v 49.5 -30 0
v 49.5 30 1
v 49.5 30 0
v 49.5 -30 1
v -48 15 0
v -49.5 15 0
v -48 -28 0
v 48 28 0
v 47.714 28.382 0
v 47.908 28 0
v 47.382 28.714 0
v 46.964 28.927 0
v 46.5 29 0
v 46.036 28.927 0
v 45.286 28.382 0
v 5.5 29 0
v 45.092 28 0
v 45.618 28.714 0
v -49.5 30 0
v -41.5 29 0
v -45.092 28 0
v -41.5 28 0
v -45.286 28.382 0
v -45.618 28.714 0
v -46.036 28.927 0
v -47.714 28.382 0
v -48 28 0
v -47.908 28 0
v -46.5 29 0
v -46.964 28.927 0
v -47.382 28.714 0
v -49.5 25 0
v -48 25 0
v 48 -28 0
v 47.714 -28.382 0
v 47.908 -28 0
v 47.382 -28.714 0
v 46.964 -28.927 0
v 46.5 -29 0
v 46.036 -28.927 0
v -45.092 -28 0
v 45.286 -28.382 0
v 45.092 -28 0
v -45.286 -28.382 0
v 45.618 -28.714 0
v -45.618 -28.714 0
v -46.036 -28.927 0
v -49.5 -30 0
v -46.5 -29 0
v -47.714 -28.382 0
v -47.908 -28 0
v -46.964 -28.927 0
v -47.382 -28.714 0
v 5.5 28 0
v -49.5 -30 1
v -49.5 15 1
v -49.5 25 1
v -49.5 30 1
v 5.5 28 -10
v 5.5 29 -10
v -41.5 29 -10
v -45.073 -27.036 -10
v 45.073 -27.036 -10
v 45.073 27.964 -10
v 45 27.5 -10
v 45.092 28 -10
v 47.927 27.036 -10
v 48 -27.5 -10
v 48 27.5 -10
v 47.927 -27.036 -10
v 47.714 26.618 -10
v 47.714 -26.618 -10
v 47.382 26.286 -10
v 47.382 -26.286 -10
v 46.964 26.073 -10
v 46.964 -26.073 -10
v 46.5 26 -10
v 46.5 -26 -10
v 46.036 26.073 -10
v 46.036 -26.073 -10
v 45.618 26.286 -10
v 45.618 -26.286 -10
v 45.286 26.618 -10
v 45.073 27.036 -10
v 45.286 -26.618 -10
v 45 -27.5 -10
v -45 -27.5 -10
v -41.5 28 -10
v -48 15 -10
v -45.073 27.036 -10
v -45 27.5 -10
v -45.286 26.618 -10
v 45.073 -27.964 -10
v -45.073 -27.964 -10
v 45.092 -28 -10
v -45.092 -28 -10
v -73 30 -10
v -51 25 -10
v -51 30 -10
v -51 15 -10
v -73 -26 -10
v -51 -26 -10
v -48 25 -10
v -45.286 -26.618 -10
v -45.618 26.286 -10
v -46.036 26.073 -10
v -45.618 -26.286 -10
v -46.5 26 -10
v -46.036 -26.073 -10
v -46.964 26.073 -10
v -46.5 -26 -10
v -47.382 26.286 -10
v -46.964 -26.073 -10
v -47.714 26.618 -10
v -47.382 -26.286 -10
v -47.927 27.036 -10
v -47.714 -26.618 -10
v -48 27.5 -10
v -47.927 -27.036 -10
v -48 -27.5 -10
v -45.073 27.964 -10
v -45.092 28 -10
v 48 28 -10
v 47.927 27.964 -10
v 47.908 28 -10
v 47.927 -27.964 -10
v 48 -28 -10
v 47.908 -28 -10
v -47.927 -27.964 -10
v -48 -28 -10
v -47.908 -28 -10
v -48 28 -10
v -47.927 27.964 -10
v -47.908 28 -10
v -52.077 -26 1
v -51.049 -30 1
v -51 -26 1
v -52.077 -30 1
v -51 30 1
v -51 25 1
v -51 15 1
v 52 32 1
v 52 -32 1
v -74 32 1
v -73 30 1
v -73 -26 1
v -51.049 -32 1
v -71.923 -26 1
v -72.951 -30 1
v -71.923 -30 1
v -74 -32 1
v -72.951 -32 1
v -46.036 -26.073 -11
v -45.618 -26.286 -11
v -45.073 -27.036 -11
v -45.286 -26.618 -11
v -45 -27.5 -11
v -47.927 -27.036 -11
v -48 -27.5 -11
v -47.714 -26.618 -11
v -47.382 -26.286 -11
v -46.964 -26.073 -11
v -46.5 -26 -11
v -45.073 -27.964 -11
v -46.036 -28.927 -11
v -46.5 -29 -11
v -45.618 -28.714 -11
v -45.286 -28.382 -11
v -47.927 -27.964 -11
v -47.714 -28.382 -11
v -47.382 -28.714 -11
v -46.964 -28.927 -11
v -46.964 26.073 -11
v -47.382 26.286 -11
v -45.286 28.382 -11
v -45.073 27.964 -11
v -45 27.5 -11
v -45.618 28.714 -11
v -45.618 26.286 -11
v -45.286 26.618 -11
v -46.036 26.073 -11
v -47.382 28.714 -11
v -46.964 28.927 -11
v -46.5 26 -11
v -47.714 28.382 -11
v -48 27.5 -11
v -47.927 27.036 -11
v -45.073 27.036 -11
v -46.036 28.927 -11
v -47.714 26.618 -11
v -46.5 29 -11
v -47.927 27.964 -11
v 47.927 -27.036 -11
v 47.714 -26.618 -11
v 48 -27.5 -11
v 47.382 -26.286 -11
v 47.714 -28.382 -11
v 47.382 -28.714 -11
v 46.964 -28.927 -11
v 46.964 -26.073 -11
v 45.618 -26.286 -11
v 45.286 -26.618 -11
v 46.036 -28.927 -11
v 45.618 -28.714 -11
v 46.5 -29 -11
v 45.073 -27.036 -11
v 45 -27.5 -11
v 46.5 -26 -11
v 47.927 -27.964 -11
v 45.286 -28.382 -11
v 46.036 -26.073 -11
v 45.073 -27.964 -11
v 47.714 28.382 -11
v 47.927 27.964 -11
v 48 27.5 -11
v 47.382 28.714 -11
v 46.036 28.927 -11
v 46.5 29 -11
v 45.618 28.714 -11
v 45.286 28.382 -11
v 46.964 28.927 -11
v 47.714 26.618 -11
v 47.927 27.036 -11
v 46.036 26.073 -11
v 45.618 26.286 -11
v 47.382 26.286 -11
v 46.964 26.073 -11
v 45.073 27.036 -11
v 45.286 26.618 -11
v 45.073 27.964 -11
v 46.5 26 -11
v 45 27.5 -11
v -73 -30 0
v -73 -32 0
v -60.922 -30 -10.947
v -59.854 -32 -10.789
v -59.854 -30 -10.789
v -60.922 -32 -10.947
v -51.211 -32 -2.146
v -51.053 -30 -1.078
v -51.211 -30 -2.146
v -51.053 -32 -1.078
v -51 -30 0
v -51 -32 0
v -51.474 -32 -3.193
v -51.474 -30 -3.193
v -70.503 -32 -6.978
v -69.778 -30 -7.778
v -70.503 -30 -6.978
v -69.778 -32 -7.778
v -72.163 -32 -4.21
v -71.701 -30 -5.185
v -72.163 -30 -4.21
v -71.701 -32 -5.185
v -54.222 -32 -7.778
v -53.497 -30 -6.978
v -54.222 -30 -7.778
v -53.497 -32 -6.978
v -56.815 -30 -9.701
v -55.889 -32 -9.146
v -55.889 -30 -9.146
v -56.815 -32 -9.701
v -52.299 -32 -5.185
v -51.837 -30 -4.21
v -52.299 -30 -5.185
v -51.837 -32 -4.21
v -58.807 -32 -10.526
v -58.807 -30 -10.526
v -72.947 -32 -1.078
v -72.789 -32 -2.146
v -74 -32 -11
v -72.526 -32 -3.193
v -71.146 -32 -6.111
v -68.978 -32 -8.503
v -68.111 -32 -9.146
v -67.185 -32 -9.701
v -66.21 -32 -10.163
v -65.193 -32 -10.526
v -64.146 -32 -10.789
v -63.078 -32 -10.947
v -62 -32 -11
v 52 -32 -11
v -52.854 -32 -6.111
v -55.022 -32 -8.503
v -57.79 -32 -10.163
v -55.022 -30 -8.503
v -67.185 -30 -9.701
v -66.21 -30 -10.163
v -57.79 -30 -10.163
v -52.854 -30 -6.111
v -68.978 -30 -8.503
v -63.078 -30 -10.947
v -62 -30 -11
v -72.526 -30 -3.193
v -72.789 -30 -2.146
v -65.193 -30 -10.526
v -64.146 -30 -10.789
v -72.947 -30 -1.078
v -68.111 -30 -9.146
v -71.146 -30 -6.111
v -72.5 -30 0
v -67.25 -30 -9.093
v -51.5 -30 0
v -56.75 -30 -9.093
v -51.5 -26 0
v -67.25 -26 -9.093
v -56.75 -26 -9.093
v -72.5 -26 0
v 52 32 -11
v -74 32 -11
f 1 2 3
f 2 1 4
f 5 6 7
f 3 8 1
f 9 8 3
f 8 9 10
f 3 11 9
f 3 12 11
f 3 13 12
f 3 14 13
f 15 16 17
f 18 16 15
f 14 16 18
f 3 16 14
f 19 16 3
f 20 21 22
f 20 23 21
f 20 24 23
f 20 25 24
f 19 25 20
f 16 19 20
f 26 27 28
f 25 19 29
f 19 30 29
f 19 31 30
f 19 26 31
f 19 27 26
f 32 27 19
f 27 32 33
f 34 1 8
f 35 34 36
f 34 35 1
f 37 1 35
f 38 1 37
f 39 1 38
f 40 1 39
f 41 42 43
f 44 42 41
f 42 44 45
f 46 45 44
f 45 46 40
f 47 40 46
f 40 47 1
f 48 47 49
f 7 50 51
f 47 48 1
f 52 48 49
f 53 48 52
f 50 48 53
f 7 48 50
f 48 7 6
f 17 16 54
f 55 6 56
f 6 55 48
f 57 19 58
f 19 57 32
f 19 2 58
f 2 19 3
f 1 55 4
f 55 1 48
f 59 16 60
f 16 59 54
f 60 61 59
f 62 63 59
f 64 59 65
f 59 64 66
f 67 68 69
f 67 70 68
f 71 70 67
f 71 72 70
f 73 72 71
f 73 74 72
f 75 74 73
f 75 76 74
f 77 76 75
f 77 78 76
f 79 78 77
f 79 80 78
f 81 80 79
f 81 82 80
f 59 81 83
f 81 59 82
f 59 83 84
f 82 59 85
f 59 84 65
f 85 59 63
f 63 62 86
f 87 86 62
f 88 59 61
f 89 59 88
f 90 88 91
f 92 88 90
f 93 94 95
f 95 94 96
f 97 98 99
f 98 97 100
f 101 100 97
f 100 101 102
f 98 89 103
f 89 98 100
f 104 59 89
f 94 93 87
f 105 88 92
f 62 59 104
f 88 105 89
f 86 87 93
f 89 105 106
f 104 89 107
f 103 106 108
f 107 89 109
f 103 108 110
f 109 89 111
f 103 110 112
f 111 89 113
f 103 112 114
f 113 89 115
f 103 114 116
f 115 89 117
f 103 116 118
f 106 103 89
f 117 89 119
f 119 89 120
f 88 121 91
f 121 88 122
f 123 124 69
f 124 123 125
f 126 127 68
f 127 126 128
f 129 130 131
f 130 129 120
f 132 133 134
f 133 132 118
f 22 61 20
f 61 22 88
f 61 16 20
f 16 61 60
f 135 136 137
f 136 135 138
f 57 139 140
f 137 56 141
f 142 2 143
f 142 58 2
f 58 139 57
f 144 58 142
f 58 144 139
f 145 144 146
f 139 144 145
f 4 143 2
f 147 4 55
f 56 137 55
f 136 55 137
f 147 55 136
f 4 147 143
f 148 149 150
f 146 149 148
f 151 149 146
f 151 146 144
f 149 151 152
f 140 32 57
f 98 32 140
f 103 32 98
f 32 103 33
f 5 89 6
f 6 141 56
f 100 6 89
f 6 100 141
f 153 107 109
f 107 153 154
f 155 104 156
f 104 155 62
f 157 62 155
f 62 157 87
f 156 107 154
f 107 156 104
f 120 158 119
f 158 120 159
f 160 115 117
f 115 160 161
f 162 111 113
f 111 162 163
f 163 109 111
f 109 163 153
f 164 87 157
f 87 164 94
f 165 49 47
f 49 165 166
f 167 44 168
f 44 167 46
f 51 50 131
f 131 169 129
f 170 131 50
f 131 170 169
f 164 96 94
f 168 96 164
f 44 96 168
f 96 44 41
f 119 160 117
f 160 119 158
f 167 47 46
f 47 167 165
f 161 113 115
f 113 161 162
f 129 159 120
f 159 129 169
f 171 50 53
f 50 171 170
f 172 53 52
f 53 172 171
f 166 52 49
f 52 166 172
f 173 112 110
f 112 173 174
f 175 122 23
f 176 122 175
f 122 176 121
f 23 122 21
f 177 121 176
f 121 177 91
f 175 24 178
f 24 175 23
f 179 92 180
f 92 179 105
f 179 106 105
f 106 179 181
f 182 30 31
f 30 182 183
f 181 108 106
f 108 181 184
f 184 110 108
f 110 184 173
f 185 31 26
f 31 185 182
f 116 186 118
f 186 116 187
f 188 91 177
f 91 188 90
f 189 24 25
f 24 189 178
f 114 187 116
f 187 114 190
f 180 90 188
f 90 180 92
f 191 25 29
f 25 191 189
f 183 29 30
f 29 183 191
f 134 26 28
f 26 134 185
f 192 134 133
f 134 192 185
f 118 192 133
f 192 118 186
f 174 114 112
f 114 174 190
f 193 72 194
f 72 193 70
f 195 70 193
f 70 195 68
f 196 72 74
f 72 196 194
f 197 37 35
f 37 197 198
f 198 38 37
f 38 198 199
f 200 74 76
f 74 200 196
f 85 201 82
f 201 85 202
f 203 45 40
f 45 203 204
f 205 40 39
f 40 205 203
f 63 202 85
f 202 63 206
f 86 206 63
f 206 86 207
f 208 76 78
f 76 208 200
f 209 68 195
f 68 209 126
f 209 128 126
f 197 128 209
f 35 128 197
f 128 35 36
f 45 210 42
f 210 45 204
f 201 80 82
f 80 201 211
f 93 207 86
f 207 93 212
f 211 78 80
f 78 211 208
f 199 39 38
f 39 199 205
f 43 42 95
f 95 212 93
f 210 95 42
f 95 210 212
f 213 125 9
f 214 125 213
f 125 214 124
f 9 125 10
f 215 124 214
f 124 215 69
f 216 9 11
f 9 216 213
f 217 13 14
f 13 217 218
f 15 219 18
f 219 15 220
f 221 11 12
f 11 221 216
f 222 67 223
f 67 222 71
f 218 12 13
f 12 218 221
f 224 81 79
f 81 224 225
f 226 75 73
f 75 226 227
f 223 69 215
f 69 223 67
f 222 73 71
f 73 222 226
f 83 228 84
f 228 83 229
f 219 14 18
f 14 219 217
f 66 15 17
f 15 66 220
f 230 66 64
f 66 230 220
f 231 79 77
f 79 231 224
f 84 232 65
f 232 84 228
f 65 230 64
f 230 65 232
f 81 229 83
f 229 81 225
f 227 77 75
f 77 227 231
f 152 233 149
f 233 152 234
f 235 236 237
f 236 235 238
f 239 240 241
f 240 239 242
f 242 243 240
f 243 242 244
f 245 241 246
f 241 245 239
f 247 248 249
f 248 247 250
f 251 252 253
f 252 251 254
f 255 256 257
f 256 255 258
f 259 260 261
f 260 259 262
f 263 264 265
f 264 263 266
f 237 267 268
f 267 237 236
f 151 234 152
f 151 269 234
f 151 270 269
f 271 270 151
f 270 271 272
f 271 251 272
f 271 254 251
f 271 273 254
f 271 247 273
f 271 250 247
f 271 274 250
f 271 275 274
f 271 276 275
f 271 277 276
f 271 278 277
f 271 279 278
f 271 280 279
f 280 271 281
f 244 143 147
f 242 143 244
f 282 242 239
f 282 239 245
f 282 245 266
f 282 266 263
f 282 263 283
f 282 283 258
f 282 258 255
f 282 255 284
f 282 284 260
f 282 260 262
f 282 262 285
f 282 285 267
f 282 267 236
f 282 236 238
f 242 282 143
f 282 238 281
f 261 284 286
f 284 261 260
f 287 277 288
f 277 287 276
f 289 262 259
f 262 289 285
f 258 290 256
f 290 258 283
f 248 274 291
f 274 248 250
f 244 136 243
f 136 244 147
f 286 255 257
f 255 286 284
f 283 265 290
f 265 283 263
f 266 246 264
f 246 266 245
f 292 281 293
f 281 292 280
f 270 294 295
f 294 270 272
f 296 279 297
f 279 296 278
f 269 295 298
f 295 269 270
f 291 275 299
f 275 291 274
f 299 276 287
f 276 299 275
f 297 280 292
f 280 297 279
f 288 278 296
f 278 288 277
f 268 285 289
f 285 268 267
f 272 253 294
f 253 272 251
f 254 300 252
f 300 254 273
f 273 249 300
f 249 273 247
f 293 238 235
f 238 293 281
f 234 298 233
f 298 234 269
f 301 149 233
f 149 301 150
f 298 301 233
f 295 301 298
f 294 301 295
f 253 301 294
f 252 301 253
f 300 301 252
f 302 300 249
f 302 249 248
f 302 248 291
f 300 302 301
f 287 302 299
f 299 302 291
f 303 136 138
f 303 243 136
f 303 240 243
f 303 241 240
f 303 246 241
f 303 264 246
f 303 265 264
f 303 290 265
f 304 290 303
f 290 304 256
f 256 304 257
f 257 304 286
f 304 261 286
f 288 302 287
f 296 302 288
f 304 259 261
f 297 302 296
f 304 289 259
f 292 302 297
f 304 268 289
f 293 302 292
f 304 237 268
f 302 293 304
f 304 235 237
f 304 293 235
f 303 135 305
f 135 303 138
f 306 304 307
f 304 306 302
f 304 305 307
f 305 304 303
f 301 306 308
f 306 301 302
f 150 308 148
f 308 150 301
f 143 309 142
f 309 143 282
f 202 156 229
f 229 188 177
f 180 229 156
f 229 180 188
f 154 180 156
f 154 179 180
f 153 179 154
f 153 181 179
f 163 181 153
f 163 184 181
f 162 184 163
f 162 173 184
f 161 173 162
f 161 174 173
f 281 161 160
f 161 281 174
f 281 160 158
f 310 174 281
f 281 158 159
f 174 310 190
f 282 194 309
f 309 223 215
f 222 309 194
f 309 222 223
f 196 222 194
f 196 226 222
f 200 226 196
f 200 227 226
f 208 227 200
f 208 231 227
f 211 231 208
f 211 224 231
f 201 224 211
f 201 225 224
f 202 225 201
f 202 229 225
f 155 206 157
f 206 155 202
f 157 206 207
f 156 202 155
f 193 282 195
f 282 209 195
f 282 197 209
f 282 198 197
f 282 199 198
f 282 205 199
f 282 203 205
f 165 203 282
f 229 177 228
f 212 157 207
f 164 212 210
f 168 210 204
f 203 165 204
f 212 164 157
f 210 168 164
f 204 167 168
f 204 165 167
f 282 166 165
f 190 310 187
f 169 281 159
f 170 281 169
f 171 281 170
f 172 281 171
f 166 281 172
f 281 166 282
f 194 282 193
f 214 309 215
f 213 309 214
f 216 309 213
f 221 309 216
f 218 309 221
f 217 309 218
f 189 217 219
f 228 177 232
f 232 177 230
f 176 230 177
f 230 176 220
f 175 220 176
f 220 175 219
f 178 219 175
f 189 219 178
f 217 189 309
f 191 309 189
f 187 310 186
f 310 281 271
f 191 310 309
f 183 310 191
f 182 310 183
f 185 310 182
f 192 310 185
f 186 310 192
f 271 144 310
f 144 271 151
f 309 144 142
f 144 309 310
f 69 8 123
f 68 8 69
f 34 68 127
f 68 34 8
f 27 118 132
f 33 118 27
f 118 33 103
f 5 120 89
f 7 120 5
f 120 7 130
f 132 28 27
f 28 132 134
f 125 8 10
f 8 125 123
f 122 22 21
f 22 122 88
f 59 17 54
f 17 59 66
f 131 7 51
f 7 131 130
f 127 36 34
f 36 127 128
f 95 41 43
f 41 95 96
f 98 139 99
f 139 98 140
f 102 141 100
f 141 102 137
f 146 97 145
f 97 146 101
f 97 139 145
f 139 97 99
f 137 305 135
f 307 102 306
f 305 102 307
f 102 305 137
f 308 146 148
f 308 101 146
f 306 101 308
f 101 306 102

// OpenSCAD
IN_MM = 25.4;

tall_standoff_h = 55;
tall_standoff_threads = 6;
tall_standoff_or = 3;

module tall_standoff() {
	cylinder(r=tall_standoff_or, h=tall_standoff_h);
	translate([0, 0, -tall_standoff_threads])
		cylinder(r=tall_standoff_or/2, h=tall_standoff_threads);
}

acdc_w = 26;
acdc_h = 51;
acdc_d = 26;
acdc_clr = 3;
acdc_th = 2;
acdc_hole_c_c = [21, 46];
acdc_hole_ir = 3/2;

module acdc_holes() {
	for (x=[-0.5, 0.5])
		for (y=[-0.5, 0.5])
		translate([
			x*acdc_hole_c_c[0],
			y*acdc_hole_c_c[1], 0])
		cylinder(h=60, r=acdc_hole_ir, center=true, $fn=32);
}

module acdc() {
	difference() {
		union() {
			translate([0, 0, acdc_th/2])
				cube([acdc_w, acdc_h, acdc_th], center=true);
			translate([0, 0, acdc_d/2])
				cube([acdc_w-3, acdc_h-3, acdc_d], center=true);
		}
		acdc_holes();
	}
}

// ! acdc();


tblock_w = 136;
tblock_h = 35;
tblock_d = 16;
tblock_clr = 0;
tblock_th = 16;
tblock_hole_c_c = [124, 13.25];
tblock_hole_ir = 5/2;

module tblock_holes() {
	for (x=[-0.5, 0.5])
		for (y=[-0.5, 0.5])
		translate([
			x*tblock_hole_c_c[0],
			y*tblock_hole_c_c[1], 0])
		cylinder(h=60, r=tblock_hole_ir, center=true, $fn=32);
}

module tblock() {
	difference() {
		union() {
			translate([0, 0, tblock_th/2])
				cube([tblock_w, tblock_h, tblock_th], center=true);
			translate([0, 0, tblock_d/2])
				cube([tblock_w-3, tblock_h-3, tblock_d], center=true);
		}
		tblock_holes();
	}
}

// ! tblock();

arduino_w = 70;
arduino_h = 51;
arduino_d = 20;
arduino_clr = 3;
arduino_th = 2;
arduino_hole_c_c = [66, 46];
arduino_hole_ir = 3/2;

module arduino_holes() {
	for (x=[-0.5, 0.5])
		for (y=[-0.5, 0.5])
		translate([
			x*arduino_hole_c_c[0],
			y*arduino_hole_c_c[1], 0])
		cylinder(h=60, r=arduino_hole_ir, center=true, $fn=32);
}

module arduino() {
	difference() {
		union() {
			translate([0, 0, arduino_th/2])
				cube([arduino_w, arduino_h, arduino_th], center=true);
			translate([0, 0, arduino_d/2])
				cube([arduino_w-3, arduino_h-3, arduino_d], center=true);
		}
		arduino_holes();
	}
}

// ! arduino();

relay2_w = 40;
relay2_h = 50;
relay2_d = 17;
relay2_clr = 3;
relay2_th = 2;
relay2_hole_c_c = [34, 45];
relay2_hole_ir = 3/2;

module relay2_holes() {
	for (x=[-0.5, 0.5])
		for (y=[-0.5, 0.5])
		translate([
			x*relay2_hole_c_c[0],
			y*relay2_hole_c_c[1], 0])
		cylinder(h=50, r=relay2_hole_ir, center=true, $fn=32);
}

module relay2() {
	difference() {
		union() {
			translate([0, 0, relay2_th/2])
				cube([relay2_w, relay2_h, relay2_th], center=true);
			translate([0, 0, relay2_d/2])
				cube([relay2_w-3, relay2_h-3, relay2_d], center=true);
		}
		relay2_holes();
	}
}

// ! relay2();

relay4_w = 74;
relay4_h = 50;
relay4_d = 17;
relay4_clr = 3;
relay4_th = 2;
relay4_hole_c_c = [68, 45];
relay4_hole_ir = 3/2;

module relay4_holes() {
	for (x=[-0.5, 0.5])
		for (y=[-0.5, 0.5])
		translate([
			x*relay4_hole_c_c[0],
			y*relay4_hole_c_c[1], 0])
		cylinder(h=50, r=relay4_hole_ir, center=true, $fn=32);
}

module relay4() {
	difference() {
		union() {
			translate([0, 0, relay4_th/2])
				cube([relay4_w, relay4_h, relay4_th], center=true);
			translate([0, 0, relay4_d/2])
				cube([relay4_w-3, relay4_h-3, relay4_d], center=true);
		}
		relay4_holes();
	}
}

// ! relay4();

toggle_sw_body = [19, 34, 28];
toggle_or = 13/2;
toggle_thread_h = 13;
toggle_top_h = 30;
toggle_top_or = 3;

module toggle_switch() {
	translate([0, 0, -toggle_sw_body[2]/2])
		cube(toggle_sw_body, center=true);
	cylinder(r=toggle_or, h=toggle_thread_h);
	cylinder(r=toggle_top_or, h=toggle_top_h);
}

// ! toggle_switch();

module toggle_cage() {
	difference() {
		translate([-17/2, -6-8, 0])
			cube([17, 41, 2], center=false);
		* translate([-17/2, -6-8-6, 0])
			cube([17, 47, 30], center=false);
		toggle_switch();

	}
}

module stop_sw_face() {
	difference() {
		union() {
			translate([0, 0, relay4_th/2])
				cube([relay4_w, relay4_h, relay4_th], center=true);
			
		}
		translate([-13, 0, 0]) {
			# toggle_switch();
			% translate([0, 0, relay4_th])
				toggle_cage();
			translate([0, -15, -1])
				linear_extrude(4)
				text(
					"HEAT", 
					font="Helvetica:style=Negreta", 
					size=6, halign="center", valign="top");
			translate([-10, 10, -1])
				linear_extrude(4)
				text(
					"HIGH", 
					font="Helvetica:style=Negreta", 
					size=4, halign="right", valign="center");
			translate([-10, -10, -1])
				linear_extrude(4)
				text(
					"LOW", 
					font="Helvetica:style=Negreta", 
					size=4, halign="right", valign="center");
			translate([-10, 0, -1])
				linear_extrude(4)
				text(
					"OFF", 
					font="Helvetica:style=Negreta", 
					size=4, halign="right", valign="center");
		}
		translate([13, 0, 0]) {
			# toggle_switch();
			% translate([0, 0, relay4_th])
				toggle_cage();
			translate([0, -15, -1])
				linear_extrude(4)
				text(
					"PUMP", 
					font="Helvetica:style=Negreta", 
					size=6, halign="center", valign="top");
			translate([10, -10, -1])
				linear_extrude(4)
				text(
					"RUN", 
					font="Helvetica:style=Negreta", 
					size=4, halign="left", valign="center");
			translate([9, 10, -1])
				linear_extrude(4)
					text(
					"STOP", 
					font="Helvetica:style=Negreta", 
					size=4, halign="left", valign="center");
		}
		relay4_holes();
	}
	% translate([0, 0, -tall_standoff_h - tall_standoff_threads+1]) {
		relay4();
		electronics_mount(relay4_hole_c_c);
	}
}


module valve_sw_face() {
	difference() {
		union() {
			translate([0, 0, relay4_th/2])
				cube([relay4_w, relay4_h, relay4_th], center=true);
			
		}
		translate([-11, 0, 0]) {
			# toggle_switch();
			% translate([0, 0, relay4_th])
				toggle_cage();
			translate([0, -15, -1])
				linear_extrude(4)
				text(
					"IN", 
					font="Helvetica:style=Negreta", 
					size=6, halign="center", valign="top");
			translate([-10, 10, -1])
				linear_extrude(4)
				text(
					"SPA", 
					font="Helvetica:style=Negreta", 
					size=4, halign="right", valign="center");
			translate([-10, -10, -1])
				linear_extrude(4)
				text(
					"POOL", 
					font="Helvetica:style=Negreta", 
					size=4, halign="right", valign="center");
			translate([-10, 0, -1])
				linear_extrude(4)
				text(
					"AUTO", 
					font="Helvetica:style=Negreta", 
					size=4, halign="right", valign="center");
		}
		translate([11, 0, 0]) {
			# toggle_switch();
			% translate([0, 0, relay4_th])
				toggle_cage();
			translate([0, -15, -1])
				linear_extrude(4)
				text(
					"OUT", 
					font="Helvetica:style=Negreta", 
					size=6, halign="center", valign="top");
			translate([10, -10, -1])
				linear_extrude(4)
				text(
					"POOL", 
					font="Helvetica:style=Negreta", 
					size=4, halign="left", valign="center");
			translate([9, 10, -1])
				linear_extrude(4)
					text(
					"SPA", 
					font="Helvetica:style=Negreta", 
					size=4, halign="left", valign="center");
			translate([9, 0, -1])
				linear_extrude(4)
				text(
					"AUTO", 
					font="Helvetica:style=Negreta", 
					size=4, halign="left", valign="center");
		}
		relay4_holes();
	}
	% translate([0, 0, -tall_standoff_h - tall_standoff_threads+1]) {
		relay4();
		electronics_mount(relay4_hole_c_c);
	}
}

// ! stop_sw_face();

lcd_2004_w = 99;
lcd_2004_h = 60;
lcd_2004_d = 10;
lcd_2004_clr = 15;
lcd_2004_th = 2;
lcd_2004_face_h = 40;
lcd_2004_hole_c_c = [93, 55];
lcd_2004_hole_ir = 3/2; //3.5/2;

module lcd_2004_holes() {
	for (x=[-0.5, 0.5])
		for (y=[-0.5, 0.5])
		translate([
			x*lcd_2004_hole_c_c[0],
			y*lcd_2004_hole_c_c[1], -10])
		cylinder(h=60, r=lcd_2004_hole_ir, center=true, $fn=20);
	translate([0, 0, 20])
		cube([76, 26, 20], center=true);
}

module lcd_2004() {
	difference() {
		union() {
			translate([0, 0, lcd_2004_th/2])
				cube([lcd_2004_w, lcd_2004_h, lcd_2004_th], center=true);
			translate([0, 0, lcd_2004_d/2])
				cube([lcd_2004_w, lcd_2004_face_h, lcd_2004_d], center=true);
			translate([-lcd_2004_w/2+8, lcd_2004_h/2-20, -10])
				cube([47, 19, 10]);
			translate([-lcd_2004_w/2-10, lcd_2004_h/2-15, -10])
				cube([20, 10, 11]);
			// pins: 9mm to 49mm, 5mm tall, 1mm wide, 2.5mm in from long side
			translate([-lcd_2004_w/2+9, lcd_2004_h/2-3, 2])
				cube([40, 1, 6]);
				// TODO: pins are 5 mm, not 6 tall
		}
		lcd_2004_holes();
	}
}

// ! lcd_2004();

module cordgrip() {
	translate([-62, -30, 0])
		rotate([-90, 0, 0]) {
			cylinder(r=13/2, h=50, $fn=64, center=true);
			cylinder(r=21/2, h=5, $fn=6);
	}
}

module cordgrip_wrap() {
	difference() {
		translate([-62, -28, 0])
			rotate([-90, 0, 0])
			cylinder(r=22/2, h=8, $fn=64, center=true);
		// # cordgrip();	
		translate([-62, -25, -9])
			cube([24, 10, 20], center=true);
	}
}

module display_front_face() {
	difference() {
		union() {
			translate([-11, 0, 6])
				cube([126, 64, 10], center=true);
			cordgrip_wrap();
		}
		lcd_2004();
		lcd_2004_holes();
		translate([-62, 2, 0])
			cube([22, 56, 20], center=true);
		translate([0, -25, 5])
			cube([99, 8, 10], center=true);
		translate([0, 25, 5])
			cube([99, 8, 10], center=true);
		// % translate([-63, 0, 0])
		// 	cube([19, 27, 11], center=true);
		translate([-62, 0, 0])
			cylinder(r=7/2, h=60, center=true);
		cordgrip();
	}
}

// ! display_front_face();

module display_back_face() {
	difference() {
		union() {
			translate([-11, 0, -5])
				cube([126, 64, 12], center=true);
		
		}
		lcd_2004();
		lcd_2004_holes();
		translate([0, 0, -5])
			cube([96, 56, 10], center=true);
		translate([-62, 2, 0])
			cube([22, 56, 20], center=true);
		cordgrip_wrap();
		cordgrip();


	}
}

! display_back_face();

module display_design() {
	// color(alpha=0.2) 
		display_front_face();
	// display_front_face_short();
	// color(alpha=0.2) 
		display_back_face();
	// display_back_face_short();
	// % lcd_2004();
}

! display_design();

module display_front_face_short() {
	intersection() {
		display_front_face();
		translate([0, 0, 10])
			cube([200, 200, 1], center=true);
	}
}

// ! display_front_face_short();

module display_back_face_short() {
	intersection() {
		display_back_face();
		translate([0, 0, 0])
			cube([200, 200, 1], center=true);
	}
}

// ! display_back_face_short();

bbox_size = [250, 150, 100];

// bbox_holes = [
// 	[-64, 10],
// 	[64, 10],
// 	[-197/2, 112],
// 	[197/2, 112],
// 	[-30, 112],
// 	[30, 112],
// ];

bbox_holes = [
	[-64, 1/2 * IN_MM],
	[64, 1/2 * IN_MM],
	[-7.75*IN_MM/2, 4.5 * IN_MM],
	[7.75*IN_MM/2, 4.5 * IN_MM],
	[-(2+3/8)*IN_MM/2, 4.5 * IN_MM],
	[(2+3/8)*IN_MM/2, 4.5 * IN_MM],
];
bbox_hole_r = 5/2;

module breaker_box_holes() {
	for (p=bbox_holes) {
		translate([p[0], bbox_size[1]/2-p[1], 0])
			cylinder(r=bbox_hole_r, h=bbox_size[2]*2, center=true, $fn=32);
	}
}

// breaker_box_holes();

module breaker_box() {
	% difference() {
		translate([0, 0, -bbox_size[2]/2-1]) 
			cube([bbox_size[0], bbox_size[1], 2], center=true);
		breaker_box_holes();
	}
}

// % breaker_box();

bbox_mount_th = 2;

module breaker_box_mount() {
	difference() {
		union() {
			for (p=bbox_holes) {
				translate([p[0], 150/2-p[1], 0])
					cylinder(r=bbox_hole_r*2, h=bbox_mount_th, center=false, $fn=32);
			}
			translate([-100, bbox_size[1]/2 - bbox_holes[2][1] - 5, 0])
				cube([200, 10, bbox_mount_th], center=false);
			translate([bbox_holes[0][0], bbox_size[1]/2 - bbox_holes[0][1] - 5, 0])
				cube([abs(bbox_holes[0][0]*2), 10, bbox_mount_th], center=false);
			translate([bbox_holes[0][0], bbox_size[1]/2 - bbox_holes[0][1], 0])
				rotate([0, 0, -108.5])
				translate([54, 0, bbox_mount_th/2])
				cube([108, 10, bbox_mount_th], center=true);
			translate([bbox_holes[0][0], bbox_size[1]/2 - bbox_holes[0][1], 0])
				rotate([0, 0, -71.5])
				translate([54, 0, bbox_mount_th/2])
				cube([108, 10, bbox_mount_th], center=true);
			translate([bbox_holes[1][0], bbox_size[1]/2 - bbox_holes[1][1], 0])
				rotate([0, 0, -108.5])
				translate([54, 0, bbox_mount_th/2])
				cube([108, 10, bbox_mount_th], center=true);
			translate([bbox_holes[1][0], bbox_size[1]/2 - bbox_holes[1][1], 0])
				rotate([0, 0, -71.5])
				translate([54, 0, bbox_mount_th/2])
				cube([108, 10, bbox_mount_th], center=true);
			translate([-85, 11.5, 0])
				cube([170, 10, bbox_mount_th], center=false);
			translate([-62, -50, bbox_mount_th/2])
				cube([10, 35, bbox_mount_th], center=true);
			translate([62, -50, bbox_mount_th/2])
				cube([10, 35, bbox_mount_th], center=true);
			
		}
		breaker_box_holes();
	}
}

// breaker_box_mount();

module electronics() {
	translate(valve_relay_offset)
		% relay4();
	translate(pump_relay_offset)
		% relay4();
	translate(clean_relay_offset)
		rotate(clean_relay_rotation)
		% relay2();
	translate(acdc_offset)
		% acdc();
	translate(tblock_offset)
		% tblock();
	translate(arduino_offset)
		% arduino();
}

// ! electronics();

electronics_holes = [
	relay2_hole_c_c,
	relay4_hole_c_c,
];
electronics_hole_r = 3/2;

module electronics_holes(p, ir=electronics_hole_r) {
	translate([p[0]/2, p[1]/2, 5/2]) {
		cylinder(r=ir, h=6, center=true, $fn=32);
	}
	translate([p[0]/2, -p[1]/2, 5/2])
		cylinder(r=ir, h=6, center=true, $fn=32);
	translate([-p[0]/2, p[1]/2, 5/2])
		cylinder(r=ir, h=6, center=true, $fn=32);
	translate([-p[0]/2, -p[1]/2, 5/2])
		cylinder(r=ir, h=6, center=true, $fn=32);
}

module electronics_mount(p, ir=electronics_hole_r, or=5) {
	difference() {
		union() {
			translate([p[0]/2, p[1]/2, 5/2]) {
				% translate([0, 0, 2.5])
					tall_standoff();
				cylinder(r1=or, r2=ir+1, h=5, center=true, $fn=32);
			}
			translate([-p[0]/2, p[1]/2, 5/2]) {
				% translate([0, 0, 2.5])
					tall_standoff();
				cylinder(r1=or, r2=ir+1, h=5, center=true, $fn=32);
			}
			translate([p[0]/2, -p[1]/2, 5/2]) {
				% translate([0, 0, 2.5])
					tall_standoff();
				cylinder(r1=or, r2=ir+1, h=5, center=true, $fn=32);
			}
			translate([-p[0]/2, -p[1]/2, 5/2]) {
				% translate([0, 0, 2.5])
					tall_standoff();
				cylinder(r1=or, r2=ir+1, h=5, center=true, $fn=32);
			}
		}
		electronics_holes(p);
	}
}

acdc_offset = [0, -10, 0];
tblock_offset = [0, -60, 0];
arduino_offset = [-25, 44, 0];
valve_relay_offset = [52.5, -10, 0];
pump_relay_offset = [-52.5, -10, 0];
clean_relay_offset = [36, 40, 0];
clean_relay_rotation = [0, 0, 90];

module box_plate() {
	% translate([0, 0, -bbox_size[2]/2+5])
		electronics();
	difference() {
		union() {
			translate([0, 0, -bbox_size[2]/2]) {
				breaker_box_mount();
				translate(pump_relay_offset)
					electronics_mount(relay4_hole_c_c);	
				translate(valve_relay_offset)
					electronics_mount(relay4_hole_c_c);	
				translate(clean_relay_offset)
					rotate(clean_relay_rotation)
					electronics_mount(relay2_hole_c_c);	
				translate(acdc_offset)
					electronics_mount(acdc_hole_c_c);
				translate(tblock_offset)
					electronics_mount(tblock_hole_c_c);
				translate(arduino_offset)
					electronics_mount(arduino_hole_c_c);	
			}
		}
		translate([0, 0, -bbox_size[2]/2]) {
			translate(pump_relay_offset)
				electronics_holes(relay4_hole_c_c);
			translate(valve_relay_offset)
				electronics_holes(relay4_hole_c_c);	
			translate(clean_relay_offset)
				rotate(clean_relay_rotation)
				electronics_holes(relay2_hole_c_c);	
			translate(acdc_offset)
				electronics_holes(acdc_hole_c_c);
			translate(tblock_offset)
				electronics_holes(tblock_hole_c_c);
			translate(arduino_offset)
				electronics_holes(arduino_hole_c_c);
		}
	}
	// translate([-intermatic_w/2, -intermatic_l/2, 0])
	// 	intermatic_face();
	// translate([0, 0, intermatic_h/2])
	// 	front_face();
	// translate([0, 0, -intermatic_d])
	// 	back_face();
	// % translate([0, 0, -intermatic_d])
	// 	cube([intermatic_w, intermatic_l, intermatic_d]);
	// % translate([0, 0, 0])
	// 	cube([intermatic_w, intermatic_l, intermatic_h]);
}

module design() {
	box_plate();
	// % breaker_box();
	translate(pump_relay_offset + [0, 0, 10])
		stop_sw_face();
	translate(valve_relay_offset + [0, 0, 10])
		valve_sw_face();
}

design();

module box_plate_short() {
	intersection() {
		box_plate();
		translate([0, 0, -bbox_size[2]/2 + 1])
			cube([250, 250, 1], center=true);
	}
}

// box_plate_short();
